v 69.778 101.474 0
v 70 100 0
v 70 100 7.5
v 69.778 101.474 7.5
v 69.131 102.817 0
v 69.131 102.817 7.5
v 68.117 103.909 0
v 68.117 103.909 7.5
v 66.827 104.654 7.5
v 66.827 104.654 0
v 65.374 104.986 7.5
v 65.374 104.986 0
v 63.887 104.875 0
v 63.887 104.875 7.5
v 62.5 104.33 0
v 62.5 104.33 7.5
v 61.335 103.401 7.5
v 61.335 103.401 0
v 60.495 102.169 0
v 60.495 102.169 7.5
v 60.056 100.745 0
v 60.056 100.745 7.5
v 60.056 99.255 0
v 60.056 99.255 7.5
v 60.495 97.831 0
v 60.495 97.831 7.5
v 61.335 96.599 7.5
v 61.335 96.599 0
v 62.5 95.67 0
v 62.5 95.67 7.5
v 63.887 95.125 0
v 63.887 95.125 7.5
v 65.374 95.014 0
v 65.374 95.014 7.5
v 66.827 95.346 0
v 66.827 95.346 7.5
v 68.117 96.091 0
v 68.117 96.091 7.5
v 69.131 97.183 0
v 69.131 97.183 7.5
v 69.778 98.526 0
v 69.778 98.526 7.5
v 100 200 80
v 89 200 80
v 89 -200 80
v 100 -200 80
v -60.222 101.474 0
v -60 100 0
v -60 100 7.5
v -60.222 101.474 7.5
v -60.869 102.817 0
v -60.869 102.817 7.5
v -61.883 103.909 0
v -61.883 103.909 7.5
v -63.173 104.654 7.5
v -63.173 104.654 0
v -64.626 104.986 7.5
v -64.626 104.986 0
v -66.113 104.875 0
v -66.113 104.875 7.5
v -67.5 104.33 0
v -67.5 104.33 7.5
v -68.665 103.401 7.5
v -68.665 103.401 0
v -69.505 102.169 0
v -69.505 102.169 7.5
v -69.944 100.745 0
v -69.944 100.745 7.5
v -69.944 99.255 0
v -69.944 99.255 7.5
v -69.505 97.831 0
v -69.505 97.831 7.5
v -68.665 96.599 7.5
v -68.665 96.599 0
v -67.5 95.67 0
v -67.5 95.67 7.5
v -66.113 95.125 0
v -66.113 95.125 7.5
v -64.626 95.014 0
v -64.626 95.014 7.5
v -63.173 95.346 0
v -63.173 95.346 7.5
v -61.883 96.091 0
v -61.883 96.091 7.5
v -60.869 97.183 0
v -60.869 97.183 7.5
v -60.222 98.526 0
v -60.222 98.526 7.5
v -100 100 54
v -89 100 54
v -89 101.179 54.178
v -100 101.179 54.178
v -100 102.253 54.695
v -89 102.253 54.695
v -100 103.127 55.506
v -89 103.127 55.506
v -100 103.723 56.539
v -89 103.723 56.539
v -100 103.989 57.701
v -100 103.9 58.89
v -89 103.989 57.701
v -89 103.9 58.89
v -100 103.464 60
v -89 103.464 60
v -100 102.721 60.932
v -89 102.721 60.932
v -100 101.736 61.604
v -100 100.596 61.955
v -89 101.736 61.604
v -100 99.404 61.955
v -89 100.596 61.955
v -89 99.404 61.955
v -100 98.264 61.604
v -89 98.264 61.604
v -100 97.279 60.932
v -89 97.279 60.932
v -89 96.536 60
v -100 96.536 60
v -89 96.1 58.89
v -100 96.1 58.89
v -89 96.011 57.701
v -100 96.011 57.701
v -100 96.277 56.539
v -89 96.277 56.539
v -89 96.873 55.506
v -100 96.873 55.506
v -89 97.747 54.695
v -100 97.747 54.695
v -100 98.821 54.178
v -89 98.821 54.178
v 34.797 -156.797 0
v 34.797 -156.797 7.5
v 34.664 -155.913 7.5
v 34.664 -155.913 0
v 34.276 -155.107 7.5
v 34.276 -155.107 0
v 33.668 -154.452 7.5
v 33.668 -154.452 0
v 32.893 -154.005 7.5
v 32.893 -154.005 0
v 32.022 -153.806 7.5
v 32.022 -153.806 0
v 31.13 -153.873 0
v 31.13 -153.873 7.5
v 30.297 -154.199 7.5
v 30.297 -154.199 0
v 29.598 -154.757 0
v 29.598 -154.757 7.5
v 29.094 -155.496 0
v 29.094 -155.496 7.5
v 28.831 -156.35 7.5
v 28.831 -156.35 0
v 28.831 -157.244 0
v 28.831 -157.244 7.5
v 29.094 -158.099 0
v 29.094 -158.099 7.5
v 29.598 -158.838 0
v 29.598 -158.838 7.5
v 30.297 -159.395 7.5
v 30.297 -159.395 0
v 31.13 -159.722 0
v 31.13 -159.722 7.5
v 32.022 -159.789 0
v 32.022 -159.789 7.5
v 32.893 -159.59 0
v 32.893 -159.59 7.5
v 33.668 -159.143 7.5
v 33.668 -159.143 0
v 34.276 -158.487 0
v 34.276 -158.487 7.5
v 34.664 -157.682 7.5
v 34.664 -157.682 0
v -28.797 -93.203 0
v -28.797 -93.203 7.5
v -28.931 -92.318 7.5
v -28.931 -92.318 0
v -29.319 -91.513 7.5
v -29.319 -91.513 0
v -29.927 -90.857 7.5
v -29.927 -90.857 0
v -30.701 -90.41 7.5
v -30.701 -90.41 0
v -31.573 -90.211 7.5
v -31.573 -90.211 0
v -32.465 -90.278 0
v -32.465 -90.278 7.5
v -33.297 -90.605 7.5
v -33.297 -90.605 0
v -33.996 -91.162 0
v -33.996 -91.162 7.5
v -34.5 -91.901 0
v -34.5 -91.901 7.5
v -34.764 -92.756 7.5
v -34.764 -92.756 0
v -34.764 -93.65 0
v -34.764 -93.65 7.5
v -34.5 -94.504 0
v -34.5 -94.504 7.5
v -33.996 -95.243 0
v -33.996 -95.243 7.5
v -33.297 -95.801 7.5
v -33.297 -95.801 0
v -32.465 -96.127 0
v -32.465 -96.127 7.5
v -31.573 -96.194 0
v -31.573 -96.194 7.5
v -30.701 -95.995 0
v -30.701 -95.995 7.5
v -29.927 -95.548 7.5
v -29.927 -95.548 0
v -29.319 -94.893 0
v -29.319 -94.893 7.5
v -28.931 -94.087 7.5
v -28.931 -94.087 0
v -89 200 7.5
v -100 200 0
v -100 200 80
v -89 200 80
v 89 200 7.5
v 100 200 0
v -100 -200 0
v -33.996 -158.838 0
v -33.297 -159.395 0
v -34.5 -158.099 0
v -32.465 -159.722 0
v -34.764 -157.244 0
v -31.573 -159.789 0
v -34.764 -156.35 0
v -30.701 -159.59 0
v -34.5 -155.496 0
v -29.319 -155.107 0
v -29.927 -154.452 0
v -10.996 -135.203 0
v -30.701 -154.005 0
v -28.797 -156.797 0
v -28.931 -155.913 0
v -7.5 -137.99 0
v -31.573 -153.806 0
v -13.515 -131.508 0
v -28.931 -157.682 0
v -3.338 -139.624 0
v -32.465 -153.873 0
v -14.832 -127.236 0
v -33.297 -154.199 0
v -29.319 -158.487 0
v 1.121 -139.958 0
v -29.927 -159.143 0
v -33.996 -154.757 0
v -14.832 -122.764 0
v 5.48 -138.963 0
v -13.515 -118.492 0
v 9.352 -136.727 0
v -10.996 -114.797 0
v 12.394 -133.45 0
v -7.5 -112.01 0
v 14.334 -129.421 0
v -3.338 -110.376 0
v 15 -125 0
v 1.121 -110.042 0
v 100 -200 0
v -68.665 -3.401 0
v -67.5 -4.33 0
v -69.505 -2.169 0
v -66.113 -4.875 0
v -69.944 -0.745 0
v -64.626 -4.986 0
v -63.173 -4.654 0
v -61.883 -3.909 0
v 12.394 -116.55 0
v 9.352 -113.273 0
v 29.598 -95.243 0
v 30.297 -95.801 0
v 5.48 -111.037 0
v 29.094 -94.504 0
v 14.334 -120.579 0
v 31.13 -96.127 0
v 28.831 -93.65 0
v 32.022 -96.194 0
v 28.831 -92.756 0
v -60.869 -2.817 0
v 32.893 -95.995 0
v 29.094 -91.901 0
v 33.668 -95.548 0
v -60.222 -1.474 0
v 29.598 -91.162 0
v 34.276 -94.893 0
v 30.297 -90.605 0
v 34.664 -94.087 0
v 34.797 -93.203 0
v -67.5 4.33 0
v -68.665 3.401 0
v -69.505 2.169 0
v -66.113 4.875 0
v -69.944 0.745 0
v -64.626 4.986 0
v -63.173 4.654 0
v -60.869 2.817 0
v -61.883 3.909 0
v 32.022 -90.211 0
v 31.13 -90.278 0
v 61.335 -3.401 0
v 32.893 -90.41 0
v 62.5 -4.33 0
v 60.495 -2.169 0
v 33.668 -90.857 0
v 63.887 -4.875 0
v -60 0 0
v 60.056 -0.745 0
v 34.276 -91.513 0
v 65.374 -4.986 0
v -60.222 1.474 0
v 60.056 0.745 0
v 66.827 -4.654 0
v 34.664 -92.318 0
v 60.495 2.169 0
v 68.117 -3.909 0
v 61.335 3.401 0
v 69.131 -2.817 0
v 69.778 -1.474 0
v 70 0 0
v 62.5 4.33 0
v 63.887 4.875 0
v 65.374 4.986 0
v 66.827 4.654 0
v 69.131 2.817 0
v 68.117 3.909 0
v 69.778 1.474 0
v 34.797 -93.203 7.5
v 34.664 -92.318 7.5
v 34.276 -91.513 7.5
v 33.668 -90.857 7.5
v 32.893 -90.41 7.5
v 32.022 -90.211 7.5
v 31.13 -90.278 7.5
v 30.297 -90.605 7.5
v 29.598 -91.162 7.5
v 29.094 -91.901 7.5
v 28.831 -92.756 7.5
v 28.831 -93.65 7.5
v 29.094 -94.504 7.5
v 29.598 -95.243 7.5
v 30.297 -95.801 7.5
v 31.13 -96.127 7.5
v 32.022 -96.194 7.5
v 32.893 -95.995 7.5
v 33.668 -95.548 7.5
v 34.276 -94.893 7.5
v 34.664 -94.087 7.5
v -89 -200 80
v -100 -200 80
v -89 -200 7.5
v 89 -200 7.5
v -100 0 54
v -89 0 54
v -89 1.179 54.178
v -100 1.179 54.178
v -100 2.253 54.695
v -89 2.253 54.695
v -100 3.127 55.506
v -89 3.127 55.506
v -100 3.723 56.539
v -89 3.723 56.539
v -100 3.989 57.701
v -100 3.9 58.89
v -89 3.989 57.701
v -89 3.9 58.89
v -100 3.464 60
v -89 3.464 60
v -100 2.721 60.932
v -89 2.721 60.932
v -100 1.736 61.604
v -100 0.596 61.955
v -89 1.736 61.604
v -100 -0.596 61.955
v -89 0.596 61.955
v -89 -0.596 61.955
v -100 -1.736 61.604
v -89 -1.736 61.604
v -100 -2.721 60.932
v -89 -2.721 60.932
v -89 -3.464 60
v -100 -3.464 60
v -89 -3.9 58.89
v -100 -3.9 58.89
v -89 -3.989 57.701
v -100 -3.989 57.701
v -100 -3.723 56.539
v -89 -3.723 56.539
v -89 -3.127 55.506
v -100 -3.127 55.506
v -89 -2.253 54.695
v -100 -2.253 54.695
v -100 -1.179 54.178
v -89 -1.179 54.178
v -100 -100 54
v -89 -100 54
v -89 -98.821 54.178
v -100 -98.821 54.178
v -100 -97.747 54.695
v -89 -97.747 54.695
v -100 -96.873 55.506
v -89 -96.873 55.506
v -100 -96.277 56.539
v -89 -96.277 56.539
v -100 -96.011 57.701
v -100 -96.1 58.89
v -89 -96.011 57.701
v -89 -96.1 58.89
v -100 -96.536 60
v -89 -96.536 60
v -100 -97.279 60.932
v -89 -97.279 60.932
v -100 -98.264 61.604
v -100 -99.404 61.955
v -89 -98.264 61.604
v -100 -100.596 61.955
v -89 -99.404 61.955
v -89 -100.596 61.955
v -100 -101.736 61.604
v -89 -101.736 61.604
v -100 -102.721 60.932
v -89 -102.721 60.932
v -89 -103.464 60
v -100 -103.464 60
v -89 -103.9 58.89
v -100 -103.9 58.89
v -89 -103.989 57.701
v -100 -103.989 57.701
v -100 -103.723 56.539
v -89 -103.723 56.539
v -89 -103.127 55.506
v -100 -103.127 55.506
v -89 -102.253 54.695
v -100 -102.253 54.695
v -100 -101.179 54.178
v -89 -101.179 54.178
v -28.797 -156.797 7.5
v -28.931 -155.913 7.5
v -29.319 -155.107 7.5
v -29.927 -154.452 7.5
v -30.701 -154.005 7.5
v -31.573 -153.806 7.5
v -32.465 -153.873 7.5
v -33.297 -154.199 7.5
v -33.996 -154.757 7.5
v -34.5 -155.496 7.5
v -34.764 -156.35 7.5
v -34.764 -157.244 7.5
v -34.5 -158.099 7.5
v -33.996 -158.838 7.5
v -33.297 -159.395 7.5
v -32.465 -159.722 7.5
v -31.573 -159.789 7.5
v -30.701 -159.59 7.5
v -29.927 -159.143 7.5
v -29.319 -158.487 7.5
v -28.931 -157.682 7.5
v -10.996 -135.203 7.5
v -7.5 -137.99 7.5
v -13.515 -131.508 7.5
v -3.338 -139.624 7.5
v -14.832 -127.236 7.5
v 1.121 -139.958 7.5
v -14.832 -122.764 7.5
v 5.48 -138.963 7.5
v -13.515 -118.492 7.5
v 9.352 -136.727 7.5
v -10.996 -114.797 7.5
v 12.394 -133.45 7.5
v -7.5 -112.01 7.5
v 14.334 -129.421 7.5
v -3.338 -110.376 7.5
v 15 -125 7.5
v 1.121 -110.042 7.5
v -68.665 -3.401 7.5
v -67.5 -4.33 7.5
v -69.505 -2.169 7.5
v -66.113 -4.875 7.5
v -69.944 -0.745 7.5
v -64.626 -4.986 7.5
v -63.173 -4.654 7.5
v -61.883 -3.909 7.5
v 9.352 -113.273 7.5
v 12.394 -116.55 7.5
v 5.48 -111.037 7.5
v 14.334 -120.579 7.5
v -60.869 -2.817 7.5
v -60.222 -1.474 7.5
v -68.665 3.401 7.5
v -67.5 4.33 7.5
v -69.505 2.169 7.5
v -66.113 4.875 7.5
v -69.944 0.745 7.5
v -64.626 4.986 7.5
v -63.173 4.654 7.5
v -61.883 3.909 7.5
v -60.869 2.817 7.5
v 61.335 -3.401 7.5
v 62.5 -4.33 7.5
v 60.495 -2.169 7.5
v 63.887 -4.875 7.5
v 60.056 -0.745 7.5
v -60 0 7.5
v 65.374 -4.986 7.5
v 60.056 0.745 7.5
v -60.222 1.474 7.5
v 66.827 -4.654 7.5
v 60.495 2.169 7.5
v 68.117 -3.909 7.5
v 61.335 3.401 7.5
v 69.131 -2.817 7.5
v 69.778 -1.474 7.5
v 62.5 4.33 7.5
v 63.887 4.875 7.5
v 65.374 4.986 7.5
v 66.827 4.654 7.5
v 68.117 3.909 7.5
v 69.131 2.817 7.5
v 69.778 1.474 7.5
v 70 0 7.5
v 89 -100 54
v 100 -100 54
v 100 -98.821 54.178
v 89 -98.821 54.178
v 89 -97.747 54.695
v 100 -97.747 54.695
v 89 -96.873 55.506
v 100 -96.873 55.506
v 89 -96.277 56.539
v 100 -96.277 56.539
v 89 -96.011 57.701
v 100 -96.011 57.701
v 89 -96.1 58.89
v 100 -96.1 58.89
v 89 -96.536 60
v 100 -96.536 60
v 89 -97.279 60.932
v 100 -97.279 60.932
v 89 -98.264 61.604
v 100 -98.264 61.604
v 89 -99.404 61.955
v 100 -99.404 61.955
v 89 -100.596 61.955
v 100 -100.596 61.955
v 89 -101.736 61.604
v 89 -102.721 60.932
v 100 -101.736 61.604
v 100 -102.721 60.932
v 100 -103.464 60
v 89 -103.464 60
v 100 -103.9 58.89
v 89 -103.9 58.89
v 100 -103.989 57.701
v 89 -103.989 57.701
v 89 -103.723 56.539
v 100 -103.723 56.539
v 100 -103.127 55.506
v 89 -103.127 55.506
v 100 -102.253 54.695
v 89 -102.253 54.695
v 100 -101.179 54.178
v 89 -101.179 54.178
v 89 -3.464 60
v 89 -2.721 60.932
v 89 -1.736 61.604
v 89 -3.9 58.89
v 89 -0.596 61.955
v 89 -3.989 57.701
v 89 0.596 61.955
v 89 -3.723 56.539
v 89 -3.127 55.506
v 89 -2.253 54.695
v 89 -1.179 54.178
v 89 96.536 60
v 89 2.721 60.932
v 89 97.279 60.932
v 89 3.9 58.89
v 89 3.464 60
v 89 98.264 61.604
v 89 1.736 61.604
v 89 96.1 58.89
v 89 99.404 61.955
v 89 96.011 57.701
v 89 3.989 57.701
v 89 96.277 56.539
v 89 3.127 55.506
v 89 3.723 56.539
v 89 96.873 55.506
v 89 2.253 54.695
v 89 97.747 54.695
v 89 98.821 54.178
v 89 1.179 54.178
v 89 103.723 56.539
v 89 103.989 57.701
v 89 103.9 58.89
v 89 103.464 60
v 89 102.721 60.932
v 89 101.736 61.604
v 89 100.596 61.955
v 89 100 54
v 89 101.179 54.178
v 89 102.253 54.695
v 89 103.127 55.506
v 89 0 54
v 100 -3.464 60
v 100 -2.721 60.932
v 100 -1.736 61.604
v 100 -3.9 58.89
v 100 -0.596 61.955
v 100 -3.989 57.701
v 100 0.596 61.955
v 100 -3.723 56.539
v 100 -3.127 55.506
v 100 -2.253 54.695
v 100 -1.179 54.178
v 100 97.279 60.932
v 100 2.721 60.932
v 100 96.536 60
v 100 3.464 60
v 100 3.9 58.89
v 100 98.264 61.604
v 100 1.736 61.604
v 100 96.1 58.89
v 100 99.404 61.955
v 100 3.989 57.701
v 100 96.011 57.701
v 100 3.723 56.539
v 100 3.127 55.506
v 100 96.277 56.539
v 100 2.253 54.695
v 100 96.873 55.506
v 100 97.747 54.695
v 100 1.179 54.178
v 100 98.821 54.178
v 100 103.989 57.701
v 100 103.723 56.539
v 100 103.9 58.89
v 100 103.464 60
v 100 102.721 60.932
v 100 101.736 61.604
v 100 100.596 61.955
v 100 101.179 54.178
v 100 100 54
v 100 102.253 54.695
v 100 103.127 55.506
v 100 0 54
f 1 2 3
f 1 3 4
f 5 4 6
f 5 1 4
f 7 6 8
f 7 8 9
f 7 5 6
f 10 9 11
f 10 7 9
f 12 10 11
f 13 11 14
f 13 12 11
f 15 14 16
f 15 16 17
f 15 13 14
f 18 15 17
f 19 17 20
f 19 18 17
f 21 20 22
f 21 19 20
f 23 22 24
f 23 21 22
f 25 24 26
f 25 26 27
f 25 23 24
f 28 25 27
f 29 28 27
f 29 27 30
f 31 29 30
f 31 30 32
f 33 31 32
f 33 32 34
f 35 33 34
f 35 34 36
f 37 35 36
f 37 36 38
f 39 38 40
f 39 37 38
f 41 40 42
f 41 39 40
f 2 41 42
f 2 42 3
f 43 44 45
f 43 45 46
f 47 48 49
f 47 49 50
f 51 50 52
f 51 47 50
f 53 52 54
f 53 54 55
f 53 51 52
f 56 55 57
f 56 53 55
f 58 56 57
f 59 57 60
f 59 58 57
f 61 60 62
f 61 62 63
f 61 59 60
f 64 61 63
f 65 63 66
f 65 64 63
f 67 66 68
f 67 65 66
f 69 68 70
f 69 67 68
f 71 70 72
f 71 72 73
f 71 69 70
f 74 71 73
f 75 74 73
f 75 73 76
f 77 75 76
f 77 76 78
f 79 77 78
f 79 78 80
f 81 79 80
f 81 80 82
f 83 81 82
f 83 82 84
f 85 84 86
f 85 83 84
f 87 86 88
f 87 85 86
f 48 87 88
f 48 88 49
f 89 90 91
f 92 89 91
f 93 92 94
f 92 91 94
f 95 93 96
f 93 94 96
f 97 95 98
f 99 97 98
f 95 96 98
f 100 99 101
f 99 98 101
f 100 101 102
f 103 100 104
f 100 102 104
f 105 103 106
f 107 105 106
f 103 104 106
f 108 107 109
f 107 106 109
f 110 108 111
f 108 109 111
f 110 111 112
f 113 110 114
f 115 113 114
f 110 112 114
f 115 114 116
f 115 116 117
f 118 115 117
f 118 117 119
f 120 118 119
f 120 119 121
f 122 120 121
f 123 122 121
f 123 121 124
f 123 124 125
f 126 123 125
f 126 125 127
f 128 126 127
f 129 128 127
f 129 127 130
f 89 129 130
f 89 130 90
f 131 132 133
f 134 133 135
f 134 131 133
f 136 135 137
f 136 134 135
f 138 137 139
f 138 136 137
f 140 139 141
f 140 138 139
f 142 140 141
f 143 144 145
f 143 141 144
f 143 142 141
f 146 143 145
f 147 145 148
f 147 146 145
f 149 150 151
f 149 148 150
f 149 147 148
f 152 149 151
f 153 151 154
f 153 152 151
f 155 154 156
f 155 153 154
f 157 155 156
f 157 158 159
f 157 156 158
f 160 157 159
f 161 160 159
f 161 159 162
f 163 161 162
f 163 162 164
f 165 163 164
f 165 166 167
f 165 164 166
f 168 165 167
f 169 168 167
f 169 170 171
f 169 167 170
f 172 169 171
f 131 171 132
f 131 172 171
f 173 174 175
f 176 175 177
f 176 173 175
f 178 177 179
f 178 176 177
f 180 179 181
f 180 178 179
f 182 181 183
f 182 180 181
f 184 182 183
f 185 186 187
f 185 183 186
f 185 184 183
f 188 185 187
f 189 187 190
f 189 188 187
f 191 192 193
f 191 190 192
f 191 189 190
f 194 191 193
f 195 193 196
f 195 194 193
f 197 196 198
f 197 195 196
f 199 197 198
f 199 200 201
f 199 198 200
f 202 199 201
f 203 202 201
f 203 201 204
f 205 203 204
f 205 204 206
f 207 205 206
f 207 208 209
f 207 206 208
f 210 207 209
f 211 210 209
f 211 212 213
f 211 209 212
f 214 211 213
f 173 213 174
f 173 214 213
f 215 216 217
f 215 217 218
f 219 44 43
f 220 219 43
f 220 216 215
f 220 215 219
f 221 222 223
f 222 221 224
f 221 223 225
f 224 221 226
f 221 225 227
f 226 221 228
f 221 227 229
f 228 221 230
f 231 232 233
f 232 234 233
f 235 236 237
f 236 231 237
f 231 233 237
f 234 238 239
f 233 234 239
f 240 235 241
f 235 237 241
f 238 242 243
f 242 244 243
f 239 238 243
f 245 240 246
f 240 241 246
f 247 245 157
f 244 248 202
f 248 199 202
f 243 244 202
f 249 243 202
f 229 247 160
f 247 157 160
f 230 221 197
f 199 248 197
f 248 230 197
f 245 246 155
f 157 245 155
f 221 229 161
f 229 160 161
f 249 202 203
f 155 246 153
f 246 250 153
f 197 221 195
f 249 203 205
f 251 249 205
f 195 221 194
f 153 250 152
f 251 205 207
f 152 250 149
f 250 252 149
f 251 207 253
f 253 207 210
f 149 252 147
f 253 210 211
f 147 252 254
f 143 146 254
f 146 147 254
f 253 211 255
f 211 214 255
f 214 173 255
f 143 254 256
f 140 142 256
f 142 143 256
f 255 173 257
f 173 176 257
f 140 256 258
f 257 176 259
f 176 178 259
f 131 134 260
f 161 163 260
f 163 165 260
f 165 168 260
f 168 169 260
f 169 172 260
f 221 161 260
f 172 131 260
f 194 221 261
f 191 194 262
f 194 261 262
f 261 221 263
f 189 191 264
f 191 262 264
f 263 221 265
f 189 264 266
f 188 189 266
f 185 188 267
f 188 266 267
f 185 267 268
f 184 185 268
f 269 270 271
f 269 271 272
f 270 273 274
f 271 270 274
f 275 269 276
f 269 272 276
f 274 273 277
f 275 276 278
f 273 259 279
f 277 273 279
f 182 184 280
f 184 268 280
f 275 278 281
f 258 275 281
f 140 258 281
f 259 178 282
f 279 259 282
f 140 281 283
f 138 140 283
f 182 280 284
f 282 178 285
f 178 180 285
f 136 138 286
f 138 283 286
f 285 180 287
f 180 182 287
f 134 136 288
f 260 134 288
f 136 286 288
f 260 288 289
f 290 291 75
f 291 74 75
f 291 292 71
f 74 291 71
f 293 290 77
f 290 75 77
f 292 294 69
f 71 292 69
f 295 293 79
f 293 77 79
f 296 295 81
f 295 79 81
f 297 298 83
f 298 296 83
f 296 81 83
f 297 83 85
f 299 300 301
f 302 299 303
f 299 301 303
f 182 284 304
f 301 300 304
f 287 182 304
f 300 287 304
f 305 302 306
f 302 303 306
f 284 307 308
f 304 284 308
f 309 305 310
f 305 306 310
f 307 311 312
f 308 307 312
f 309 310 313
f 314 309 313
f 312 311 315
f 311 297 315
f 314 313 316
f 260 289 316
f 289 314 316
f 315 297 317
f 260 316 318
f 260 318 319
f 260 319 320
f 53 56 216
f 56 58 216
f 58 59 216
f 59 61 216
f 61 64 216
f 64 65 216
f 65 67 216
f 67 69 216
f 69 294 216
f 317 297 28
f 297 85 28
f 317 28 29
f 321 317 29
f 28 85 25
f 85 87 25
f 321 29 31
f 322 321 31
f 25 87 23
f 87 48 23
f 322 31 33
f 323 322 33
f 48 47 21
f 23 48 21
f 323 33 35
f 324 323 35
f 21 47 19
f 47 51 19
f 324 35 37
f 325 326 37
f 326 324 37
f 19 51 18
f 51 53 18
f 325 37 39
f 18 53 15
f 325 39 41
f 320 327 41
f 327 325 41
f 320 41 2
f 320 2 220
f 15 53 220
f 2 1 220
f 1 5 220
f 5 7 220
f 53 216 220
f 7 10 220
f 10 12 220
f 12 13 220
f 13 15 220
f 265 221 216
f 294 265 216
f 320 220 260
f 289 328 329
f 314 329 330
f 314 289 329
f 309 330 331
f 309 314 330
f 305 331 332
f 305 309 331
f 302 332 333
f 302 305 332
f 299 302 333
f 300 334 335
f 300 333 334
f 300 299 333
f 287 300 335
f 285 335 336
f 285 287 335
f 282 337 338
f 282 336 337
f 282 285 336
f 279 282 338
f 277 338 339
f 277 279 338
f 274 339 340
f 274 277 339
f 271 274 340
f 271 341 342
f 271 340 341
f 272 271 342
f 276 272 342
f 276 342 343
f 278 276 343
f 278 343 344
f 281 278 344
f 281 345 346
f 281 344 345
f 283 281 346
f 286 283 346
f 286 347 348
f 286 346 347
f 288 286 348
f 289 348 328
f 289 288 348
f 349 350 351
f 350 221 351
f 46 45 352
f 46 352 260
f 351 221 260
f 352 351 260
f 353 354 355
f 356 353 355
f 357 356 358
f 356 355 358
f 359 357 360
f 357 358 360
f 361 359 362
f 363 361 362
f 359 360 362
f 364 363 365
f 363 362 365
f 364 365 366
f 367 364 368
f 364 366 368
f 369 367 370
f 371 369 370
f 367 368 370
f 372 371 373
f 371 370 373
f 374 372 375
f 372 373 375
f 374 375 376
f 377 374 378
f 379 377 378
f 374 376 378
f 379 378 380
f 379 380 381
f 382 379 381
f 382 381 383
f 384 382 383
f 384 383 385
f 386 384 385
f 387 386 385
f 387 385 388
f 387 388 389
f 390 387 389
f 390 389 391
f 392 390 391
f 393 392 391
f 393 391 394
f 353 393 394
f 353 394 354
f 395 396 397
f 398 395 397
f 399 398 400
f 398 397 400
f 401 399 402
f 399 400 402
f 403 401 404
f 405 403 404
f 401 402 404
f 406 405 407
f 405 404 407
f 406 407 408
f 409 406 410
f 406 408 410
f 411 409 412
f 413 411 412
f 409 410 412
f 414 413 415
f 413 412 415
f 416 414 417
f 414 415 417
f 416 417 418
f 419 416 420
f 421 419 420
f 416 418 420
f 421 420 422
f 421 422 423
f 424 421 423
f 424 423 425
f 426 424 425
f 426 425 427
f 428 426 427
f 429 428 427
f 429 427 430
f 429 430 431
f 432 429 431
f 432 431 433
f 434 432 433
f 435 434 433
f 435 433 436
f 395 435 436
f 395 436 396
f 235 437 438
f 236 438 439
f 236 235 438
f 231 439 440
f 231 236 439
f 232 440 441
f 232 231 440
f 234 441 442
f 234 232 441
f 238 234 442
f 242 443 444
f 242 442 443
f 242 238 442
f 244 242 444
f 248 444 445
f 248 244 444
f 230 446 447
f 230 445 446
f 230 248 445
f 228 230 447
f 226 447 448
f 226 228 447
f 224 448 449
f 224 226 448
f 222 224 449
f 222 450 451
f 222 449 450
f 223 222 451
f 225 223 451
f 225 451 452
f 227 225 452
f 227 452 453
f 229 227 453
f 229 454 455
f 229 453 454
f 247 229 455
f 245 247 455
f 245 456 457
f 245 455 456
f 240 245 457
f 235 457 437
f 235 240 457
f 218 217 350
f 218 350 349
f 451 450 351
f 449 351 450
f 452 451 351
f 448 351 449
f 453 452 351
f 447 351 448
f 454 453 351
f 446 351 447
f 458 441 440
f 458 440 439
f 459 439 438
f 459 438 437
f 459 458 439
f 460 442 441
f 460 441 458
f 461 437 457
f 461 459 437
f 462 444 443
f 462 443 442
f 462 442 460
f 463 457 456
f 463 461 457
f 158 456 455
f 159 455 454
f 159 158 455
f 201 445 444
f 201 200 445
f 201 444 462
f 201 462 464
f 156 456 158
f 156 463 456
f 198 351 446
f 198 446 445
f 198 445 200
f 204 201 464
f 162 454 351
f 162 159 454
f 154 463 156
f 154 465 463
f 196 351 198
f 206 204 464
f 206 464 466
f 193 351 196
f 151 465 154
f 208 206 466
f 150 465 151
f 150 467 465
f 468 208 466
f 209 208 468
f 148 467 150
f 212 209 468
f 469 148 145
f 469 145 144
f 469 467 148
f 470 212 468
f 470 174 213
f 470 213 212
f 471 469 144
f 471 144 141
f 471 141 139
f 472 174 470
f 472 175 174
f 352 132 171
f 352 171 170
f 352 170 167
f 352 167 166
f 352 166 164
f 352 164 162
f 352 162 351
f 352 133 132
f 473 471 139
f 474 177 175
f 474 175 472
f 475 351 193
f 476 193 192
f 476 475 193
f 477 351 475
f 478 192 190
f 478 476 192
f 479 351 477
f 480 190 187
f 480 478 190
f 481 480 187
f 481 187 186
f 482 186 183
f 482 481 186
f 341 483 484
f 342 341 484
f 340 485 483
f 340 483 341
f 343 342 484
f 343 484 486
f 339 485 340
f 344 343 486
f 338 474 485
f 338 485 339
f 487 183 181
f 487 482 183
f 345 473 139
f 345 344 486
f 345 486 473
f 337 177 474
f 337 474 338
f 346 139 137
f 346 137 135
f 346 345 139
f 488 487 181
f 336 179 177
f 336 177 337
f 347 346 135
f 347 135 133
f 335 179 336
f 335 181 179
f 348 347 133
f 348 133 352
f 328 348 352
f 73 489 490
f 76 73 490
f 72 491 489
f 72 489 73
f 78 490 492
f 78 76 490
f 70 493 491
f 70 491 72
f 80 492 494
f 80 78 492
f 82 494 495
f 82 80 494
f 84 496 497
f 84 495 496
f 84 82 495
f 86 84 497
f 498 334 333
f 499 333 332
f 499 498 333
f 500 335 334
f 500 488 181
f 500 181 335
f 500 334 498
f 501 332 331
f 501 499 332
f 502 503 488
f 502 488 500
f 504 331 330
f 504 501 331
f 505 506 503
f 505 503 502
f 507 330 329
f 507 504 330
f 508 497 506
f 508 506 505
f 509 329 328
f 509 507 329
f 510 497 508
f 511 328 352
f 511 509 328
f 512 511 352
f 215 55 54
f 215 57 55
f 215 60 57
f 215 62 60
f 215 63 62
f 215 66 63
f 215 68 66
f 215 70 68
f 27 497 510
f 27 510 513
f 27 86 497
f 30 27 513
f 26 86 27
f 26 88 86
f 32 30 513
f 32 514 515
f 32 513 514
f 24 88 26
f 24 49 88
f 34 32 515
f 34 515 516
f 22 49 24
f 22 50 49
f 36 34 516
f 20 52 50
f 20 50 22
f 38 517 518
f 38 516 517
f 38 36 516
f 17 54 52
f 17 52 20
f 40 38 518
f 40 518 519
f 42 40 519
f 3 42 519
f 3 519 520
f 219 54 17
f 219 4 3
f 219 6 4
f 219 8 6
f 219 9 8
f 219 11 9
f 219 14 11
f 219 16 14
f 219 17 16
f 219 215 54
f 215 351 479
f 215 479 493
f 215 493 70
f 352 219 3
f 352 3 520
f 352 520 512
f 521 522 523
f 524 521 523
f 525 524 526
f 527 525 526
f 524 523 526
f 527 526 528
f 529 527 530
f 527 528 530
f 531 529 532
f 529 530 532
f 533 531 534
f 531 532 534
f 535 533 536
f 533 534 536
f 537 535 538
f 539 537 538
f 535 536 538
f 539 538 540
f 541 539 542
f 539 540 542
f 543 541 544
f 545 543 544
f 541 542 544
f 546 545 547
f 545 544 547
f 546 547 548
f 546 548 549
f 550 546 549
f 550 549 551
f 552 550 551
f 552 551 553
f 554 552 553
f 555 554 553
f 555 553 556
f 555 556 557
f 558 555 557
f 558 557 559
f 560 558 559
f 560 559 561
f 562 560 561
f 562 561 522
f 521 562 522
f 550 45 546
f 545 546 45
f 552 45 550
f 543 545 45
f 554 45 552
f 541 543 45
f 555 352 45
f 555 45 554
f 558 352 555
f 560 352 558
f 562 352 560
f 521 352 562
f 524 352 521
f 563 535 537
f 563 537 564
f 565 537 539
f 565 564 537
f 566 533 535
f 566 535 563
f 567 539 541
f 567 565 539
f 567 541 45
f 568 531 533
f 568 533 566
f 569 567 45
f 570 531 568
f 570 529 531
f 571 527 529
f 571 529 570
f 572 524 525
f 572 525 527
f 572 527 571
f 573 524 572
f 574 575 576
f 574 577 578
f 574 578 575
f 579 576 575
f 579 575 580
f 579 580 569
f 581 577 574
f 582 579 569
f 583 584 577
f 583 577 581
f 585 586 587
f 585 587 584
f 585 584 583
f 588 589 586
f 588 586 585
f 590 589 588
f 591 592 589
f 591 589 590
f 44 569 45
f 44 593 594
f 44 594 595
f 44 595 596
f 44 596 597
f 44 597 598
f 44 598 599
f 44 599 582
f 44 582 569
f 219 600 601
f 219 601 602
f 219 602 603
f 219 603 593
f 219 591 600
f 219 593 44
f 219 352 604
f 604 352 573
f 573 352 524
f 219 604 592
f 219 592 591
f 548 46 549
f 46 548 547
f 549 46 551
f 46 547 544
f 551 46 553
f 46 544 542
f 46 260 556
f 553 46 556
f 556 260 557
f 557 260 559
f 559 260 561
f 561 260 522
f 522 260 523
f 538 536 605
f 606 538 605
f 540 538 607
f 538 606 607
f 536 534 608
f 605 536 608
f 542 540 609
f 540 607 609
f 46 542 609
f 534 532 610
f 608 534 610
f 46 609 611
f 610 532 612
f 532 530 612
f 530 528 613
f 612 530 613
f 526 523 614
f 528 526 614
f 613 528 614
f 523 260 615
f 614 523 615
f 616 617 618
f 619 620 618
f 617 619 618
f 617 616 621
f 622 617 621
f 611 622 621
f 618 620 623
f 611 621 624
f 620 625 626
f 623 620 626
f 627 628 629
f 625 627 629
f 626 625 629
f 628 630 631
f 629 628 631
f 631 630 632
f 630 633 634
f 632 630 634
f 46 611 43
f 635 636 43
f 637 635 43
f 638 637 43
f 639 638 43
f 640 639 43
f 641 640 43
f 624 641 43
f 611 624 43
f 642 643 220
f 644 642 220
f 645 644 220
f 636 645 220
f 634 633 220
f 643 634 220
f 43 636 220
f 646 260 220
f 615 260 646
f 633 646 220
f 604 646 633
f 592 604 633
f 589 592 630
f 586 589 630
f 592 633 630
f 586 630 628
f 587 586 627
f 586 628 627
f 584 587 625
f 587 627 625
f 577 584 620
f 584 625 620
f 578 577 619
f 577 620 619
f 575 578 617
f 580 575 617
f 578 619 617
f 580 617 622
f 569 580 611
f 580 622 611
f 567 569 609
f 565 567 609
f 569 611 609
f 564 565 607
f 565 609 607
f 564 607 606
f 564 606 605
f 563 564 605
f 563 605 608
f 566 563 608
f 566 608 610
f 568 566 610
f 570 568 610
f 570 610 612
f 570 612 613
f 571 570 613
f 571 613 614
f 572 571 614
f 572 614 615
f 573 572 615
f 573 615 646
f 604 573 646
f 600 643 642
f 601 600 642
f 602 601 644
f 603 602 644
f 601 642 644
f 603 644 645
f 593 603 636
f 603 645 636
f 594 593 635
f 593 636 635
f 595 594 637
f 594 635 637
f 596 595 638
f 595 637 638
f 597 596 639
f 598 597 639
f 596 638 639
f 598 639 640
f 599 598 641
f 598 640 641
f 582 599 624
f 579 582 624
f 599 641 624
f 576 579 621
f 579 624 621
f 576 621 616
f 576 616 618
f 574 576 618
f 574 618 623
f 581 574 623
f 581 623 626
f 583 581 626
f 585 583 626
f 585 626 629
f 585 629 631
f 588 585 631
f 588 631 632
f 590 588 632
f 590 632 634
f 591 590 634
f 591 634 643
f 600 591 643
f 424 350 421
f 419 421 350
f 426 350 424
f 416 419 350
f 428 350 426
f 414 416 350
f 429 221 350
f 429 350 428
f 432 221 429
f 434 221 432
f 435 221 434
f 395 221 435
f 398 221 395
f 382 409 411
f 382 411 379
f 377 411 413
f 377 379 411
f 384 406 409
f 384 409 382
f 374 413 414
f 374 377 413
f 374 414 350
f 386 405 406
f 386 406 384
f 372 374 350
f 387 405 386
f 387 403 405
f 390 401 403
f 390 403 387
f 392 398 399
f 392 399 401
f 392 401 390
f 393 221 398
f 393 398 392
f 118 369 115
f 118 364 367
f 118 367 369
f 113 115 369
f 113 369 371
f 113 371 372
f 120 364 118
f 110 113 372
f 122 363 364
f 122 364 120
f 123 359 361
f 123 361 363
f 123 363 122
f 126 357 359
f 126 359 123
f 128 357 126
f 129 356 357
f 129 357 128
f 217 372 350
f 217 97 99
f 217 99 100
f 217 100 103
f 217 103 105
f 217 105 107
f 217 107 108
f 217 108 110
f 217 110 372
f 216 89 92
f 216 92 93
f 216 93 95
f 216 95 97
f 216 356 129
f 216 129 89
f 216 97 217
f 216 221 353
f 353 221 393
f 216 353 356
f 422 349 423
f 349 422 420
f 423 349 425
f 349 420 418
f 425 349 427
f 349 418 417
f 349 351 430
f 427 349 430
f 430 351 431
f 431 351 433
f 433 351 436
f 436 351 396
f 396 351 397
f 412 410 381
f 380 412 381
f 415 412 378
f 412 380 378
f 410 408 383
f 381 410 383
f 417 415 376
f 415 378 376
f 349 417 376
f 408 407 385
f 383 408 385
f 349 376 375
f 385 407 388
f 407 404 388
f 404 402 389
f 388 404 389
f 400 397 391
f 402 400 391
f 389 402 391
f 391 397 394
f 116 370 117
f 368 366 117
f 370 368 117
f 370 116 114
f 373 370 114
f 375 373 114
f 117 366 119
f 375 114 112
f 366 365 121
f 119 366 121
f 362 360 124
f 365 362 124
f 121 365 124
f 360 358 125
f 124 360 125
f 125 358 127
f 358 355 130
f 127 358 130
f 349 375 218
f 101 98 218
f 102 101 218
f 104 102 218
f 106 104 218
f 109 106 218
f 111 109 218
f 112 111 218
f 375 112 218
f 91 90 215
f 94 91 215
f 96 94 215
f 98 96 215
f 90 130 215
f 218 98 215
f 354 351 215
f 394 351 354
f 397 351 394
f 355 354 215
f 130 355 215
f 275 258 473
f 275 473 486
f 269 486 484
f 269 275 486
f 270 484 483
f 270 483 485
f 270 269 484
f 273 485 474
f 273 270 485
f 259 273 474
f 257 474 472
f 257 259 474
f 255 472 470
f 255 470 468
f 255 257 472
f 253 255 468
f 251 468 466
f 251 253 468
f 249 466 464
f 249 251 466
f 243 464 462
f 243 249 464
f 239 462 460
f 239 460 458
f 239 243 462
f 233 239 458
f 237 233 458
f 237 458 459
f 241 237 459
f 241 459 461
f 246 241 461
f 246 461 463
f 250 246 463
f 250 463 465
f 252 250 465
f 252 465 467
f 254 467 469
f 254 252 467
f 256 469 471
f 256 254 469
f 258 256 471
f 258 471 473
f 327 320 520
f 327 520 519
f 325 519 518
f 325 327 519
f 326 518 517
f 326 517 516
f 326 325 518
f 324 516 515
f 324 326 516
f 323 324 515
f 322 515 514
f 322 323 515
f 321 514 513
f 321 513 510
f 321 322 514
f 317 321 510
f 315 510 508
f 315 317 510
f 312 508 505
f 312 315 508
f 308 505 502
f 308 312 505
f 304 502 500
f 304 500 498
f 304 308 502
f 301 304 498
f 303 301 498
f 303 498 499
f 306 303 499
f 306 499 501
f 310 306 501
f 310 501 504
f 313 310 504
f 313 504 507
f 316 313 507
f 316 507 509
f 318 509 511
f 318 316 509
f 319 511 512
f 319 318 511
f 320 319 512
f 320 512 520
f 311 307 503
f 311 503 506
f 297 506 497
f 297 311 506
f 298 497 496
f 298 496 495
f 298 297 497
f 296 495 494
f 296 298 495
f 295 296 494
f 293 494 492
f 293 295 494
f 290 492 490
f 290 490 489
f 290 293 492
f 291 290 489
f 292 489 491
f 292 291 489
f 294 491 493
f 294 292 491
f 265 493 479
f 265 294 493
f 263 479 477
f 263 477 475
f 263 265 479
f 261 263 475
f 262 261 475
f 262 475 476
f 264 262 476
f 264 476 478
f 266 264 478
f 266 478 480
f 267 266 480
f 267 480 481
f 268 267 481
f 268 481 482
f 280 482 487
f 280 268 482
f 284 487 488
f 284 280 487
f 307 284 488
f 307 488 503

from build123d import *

# Parameters (mm, degrees)
SKETCH1_W           = 200
SKETCH1_H           = 400
SKETCH1_R           = 15
SKETCH1_R_2         = 5
BOSS_EXTRUDE1_DEPTH = 7.5
SKETCH4_W           = 11
SKETCH4_H           = 400
BOSS_EXTRUDE4_DEPTH = 72.5
SKETCH5_R           = 4
CUT_EXTRUDE1_DEPTH  = 200
SKETCH6_R           = 3
CUT_EXTRUDE2_DEPTH  = 10


with BuildPart() as part:
    # Sketch1 → Boss-Extrude1 (new body)
    with BuildSketch(Plane.XY):
        Rectangle(SKETCH1_W, SKETCH1_H)
        with Locations((0, -125)):
            Circle(SKETCH1_R, mode=Mode.SUBTRACT)
        with Locations((-65, 0)):
            Circle(SKETCH1_R_2, mode=Mode.SUBTRACT)
        with Locations((-65, 100)):
            Circle(SKETCH1_R_2, mode=Mode.SUBTRACT)
        with Locations((65, 100)):
            Circle(SKETCH1_R_2, mode=Mode.SUBTRACT)
        with Locations((65, 0)):
            Circle(SKETCH1_R_2, mode=Mode.SUBTRACT)
    extrude(amount=BOSS_EXTRUDE1_DEPTH)

    # Sketch4 → Boss-Extrude4 (add)
    with BuildSketch(Plane.XY.offset(7.5)):
        with Locations((-94.5, 0)):
            Rectangle(SKETCH4_W, SKETCH4_H)
        with Locations((94.5, 0)):
            Rectangle(SKETCH4_W, SKETCH4_H)
    extrude(amount=BOSS_EXTRUDE4_DEPTH)

    # Sketch5 → Cut-Extrude1 (cut)
    with BuildSketch(Plane(origin=(100, 0, 0), x_dir=(0, 0, -1), z_dir=(1, 0, 0))):
        with Locations((-58, 100)):
            Circle(SKETCH5_R)
        with Locations((-58, 0)):
            Circle(SKETCH5_R)
        with Locations((-58, -100)):
            Circle(SKETCH5_R)
    extrude(amount=-CUT_EXTRUDE1_DEPTH, mode=Mode.SUBTRACT)

    # Sketch6 → Cut-Extrude2 (cut)
    with BuildSketch(Plane.XY):
        with Locations((31.797314882, -93.202685118)):
            Circle(SKETCH6_R)
        with Locations((-31.797314882, -93.202685118)):
            Circle(SKETCH6_R)
        with Locations((-31.797314882, -156.797314882)):
            Circle(SKETCH6_R)
        with Locations((31.797314882, -156.797314882)):
            Circle(SKETCH6_R)
    extrude(amount=CUT_EXTRUDE2_DEPTH, mode=Mode.SUBTRACT)


solid = part.part
